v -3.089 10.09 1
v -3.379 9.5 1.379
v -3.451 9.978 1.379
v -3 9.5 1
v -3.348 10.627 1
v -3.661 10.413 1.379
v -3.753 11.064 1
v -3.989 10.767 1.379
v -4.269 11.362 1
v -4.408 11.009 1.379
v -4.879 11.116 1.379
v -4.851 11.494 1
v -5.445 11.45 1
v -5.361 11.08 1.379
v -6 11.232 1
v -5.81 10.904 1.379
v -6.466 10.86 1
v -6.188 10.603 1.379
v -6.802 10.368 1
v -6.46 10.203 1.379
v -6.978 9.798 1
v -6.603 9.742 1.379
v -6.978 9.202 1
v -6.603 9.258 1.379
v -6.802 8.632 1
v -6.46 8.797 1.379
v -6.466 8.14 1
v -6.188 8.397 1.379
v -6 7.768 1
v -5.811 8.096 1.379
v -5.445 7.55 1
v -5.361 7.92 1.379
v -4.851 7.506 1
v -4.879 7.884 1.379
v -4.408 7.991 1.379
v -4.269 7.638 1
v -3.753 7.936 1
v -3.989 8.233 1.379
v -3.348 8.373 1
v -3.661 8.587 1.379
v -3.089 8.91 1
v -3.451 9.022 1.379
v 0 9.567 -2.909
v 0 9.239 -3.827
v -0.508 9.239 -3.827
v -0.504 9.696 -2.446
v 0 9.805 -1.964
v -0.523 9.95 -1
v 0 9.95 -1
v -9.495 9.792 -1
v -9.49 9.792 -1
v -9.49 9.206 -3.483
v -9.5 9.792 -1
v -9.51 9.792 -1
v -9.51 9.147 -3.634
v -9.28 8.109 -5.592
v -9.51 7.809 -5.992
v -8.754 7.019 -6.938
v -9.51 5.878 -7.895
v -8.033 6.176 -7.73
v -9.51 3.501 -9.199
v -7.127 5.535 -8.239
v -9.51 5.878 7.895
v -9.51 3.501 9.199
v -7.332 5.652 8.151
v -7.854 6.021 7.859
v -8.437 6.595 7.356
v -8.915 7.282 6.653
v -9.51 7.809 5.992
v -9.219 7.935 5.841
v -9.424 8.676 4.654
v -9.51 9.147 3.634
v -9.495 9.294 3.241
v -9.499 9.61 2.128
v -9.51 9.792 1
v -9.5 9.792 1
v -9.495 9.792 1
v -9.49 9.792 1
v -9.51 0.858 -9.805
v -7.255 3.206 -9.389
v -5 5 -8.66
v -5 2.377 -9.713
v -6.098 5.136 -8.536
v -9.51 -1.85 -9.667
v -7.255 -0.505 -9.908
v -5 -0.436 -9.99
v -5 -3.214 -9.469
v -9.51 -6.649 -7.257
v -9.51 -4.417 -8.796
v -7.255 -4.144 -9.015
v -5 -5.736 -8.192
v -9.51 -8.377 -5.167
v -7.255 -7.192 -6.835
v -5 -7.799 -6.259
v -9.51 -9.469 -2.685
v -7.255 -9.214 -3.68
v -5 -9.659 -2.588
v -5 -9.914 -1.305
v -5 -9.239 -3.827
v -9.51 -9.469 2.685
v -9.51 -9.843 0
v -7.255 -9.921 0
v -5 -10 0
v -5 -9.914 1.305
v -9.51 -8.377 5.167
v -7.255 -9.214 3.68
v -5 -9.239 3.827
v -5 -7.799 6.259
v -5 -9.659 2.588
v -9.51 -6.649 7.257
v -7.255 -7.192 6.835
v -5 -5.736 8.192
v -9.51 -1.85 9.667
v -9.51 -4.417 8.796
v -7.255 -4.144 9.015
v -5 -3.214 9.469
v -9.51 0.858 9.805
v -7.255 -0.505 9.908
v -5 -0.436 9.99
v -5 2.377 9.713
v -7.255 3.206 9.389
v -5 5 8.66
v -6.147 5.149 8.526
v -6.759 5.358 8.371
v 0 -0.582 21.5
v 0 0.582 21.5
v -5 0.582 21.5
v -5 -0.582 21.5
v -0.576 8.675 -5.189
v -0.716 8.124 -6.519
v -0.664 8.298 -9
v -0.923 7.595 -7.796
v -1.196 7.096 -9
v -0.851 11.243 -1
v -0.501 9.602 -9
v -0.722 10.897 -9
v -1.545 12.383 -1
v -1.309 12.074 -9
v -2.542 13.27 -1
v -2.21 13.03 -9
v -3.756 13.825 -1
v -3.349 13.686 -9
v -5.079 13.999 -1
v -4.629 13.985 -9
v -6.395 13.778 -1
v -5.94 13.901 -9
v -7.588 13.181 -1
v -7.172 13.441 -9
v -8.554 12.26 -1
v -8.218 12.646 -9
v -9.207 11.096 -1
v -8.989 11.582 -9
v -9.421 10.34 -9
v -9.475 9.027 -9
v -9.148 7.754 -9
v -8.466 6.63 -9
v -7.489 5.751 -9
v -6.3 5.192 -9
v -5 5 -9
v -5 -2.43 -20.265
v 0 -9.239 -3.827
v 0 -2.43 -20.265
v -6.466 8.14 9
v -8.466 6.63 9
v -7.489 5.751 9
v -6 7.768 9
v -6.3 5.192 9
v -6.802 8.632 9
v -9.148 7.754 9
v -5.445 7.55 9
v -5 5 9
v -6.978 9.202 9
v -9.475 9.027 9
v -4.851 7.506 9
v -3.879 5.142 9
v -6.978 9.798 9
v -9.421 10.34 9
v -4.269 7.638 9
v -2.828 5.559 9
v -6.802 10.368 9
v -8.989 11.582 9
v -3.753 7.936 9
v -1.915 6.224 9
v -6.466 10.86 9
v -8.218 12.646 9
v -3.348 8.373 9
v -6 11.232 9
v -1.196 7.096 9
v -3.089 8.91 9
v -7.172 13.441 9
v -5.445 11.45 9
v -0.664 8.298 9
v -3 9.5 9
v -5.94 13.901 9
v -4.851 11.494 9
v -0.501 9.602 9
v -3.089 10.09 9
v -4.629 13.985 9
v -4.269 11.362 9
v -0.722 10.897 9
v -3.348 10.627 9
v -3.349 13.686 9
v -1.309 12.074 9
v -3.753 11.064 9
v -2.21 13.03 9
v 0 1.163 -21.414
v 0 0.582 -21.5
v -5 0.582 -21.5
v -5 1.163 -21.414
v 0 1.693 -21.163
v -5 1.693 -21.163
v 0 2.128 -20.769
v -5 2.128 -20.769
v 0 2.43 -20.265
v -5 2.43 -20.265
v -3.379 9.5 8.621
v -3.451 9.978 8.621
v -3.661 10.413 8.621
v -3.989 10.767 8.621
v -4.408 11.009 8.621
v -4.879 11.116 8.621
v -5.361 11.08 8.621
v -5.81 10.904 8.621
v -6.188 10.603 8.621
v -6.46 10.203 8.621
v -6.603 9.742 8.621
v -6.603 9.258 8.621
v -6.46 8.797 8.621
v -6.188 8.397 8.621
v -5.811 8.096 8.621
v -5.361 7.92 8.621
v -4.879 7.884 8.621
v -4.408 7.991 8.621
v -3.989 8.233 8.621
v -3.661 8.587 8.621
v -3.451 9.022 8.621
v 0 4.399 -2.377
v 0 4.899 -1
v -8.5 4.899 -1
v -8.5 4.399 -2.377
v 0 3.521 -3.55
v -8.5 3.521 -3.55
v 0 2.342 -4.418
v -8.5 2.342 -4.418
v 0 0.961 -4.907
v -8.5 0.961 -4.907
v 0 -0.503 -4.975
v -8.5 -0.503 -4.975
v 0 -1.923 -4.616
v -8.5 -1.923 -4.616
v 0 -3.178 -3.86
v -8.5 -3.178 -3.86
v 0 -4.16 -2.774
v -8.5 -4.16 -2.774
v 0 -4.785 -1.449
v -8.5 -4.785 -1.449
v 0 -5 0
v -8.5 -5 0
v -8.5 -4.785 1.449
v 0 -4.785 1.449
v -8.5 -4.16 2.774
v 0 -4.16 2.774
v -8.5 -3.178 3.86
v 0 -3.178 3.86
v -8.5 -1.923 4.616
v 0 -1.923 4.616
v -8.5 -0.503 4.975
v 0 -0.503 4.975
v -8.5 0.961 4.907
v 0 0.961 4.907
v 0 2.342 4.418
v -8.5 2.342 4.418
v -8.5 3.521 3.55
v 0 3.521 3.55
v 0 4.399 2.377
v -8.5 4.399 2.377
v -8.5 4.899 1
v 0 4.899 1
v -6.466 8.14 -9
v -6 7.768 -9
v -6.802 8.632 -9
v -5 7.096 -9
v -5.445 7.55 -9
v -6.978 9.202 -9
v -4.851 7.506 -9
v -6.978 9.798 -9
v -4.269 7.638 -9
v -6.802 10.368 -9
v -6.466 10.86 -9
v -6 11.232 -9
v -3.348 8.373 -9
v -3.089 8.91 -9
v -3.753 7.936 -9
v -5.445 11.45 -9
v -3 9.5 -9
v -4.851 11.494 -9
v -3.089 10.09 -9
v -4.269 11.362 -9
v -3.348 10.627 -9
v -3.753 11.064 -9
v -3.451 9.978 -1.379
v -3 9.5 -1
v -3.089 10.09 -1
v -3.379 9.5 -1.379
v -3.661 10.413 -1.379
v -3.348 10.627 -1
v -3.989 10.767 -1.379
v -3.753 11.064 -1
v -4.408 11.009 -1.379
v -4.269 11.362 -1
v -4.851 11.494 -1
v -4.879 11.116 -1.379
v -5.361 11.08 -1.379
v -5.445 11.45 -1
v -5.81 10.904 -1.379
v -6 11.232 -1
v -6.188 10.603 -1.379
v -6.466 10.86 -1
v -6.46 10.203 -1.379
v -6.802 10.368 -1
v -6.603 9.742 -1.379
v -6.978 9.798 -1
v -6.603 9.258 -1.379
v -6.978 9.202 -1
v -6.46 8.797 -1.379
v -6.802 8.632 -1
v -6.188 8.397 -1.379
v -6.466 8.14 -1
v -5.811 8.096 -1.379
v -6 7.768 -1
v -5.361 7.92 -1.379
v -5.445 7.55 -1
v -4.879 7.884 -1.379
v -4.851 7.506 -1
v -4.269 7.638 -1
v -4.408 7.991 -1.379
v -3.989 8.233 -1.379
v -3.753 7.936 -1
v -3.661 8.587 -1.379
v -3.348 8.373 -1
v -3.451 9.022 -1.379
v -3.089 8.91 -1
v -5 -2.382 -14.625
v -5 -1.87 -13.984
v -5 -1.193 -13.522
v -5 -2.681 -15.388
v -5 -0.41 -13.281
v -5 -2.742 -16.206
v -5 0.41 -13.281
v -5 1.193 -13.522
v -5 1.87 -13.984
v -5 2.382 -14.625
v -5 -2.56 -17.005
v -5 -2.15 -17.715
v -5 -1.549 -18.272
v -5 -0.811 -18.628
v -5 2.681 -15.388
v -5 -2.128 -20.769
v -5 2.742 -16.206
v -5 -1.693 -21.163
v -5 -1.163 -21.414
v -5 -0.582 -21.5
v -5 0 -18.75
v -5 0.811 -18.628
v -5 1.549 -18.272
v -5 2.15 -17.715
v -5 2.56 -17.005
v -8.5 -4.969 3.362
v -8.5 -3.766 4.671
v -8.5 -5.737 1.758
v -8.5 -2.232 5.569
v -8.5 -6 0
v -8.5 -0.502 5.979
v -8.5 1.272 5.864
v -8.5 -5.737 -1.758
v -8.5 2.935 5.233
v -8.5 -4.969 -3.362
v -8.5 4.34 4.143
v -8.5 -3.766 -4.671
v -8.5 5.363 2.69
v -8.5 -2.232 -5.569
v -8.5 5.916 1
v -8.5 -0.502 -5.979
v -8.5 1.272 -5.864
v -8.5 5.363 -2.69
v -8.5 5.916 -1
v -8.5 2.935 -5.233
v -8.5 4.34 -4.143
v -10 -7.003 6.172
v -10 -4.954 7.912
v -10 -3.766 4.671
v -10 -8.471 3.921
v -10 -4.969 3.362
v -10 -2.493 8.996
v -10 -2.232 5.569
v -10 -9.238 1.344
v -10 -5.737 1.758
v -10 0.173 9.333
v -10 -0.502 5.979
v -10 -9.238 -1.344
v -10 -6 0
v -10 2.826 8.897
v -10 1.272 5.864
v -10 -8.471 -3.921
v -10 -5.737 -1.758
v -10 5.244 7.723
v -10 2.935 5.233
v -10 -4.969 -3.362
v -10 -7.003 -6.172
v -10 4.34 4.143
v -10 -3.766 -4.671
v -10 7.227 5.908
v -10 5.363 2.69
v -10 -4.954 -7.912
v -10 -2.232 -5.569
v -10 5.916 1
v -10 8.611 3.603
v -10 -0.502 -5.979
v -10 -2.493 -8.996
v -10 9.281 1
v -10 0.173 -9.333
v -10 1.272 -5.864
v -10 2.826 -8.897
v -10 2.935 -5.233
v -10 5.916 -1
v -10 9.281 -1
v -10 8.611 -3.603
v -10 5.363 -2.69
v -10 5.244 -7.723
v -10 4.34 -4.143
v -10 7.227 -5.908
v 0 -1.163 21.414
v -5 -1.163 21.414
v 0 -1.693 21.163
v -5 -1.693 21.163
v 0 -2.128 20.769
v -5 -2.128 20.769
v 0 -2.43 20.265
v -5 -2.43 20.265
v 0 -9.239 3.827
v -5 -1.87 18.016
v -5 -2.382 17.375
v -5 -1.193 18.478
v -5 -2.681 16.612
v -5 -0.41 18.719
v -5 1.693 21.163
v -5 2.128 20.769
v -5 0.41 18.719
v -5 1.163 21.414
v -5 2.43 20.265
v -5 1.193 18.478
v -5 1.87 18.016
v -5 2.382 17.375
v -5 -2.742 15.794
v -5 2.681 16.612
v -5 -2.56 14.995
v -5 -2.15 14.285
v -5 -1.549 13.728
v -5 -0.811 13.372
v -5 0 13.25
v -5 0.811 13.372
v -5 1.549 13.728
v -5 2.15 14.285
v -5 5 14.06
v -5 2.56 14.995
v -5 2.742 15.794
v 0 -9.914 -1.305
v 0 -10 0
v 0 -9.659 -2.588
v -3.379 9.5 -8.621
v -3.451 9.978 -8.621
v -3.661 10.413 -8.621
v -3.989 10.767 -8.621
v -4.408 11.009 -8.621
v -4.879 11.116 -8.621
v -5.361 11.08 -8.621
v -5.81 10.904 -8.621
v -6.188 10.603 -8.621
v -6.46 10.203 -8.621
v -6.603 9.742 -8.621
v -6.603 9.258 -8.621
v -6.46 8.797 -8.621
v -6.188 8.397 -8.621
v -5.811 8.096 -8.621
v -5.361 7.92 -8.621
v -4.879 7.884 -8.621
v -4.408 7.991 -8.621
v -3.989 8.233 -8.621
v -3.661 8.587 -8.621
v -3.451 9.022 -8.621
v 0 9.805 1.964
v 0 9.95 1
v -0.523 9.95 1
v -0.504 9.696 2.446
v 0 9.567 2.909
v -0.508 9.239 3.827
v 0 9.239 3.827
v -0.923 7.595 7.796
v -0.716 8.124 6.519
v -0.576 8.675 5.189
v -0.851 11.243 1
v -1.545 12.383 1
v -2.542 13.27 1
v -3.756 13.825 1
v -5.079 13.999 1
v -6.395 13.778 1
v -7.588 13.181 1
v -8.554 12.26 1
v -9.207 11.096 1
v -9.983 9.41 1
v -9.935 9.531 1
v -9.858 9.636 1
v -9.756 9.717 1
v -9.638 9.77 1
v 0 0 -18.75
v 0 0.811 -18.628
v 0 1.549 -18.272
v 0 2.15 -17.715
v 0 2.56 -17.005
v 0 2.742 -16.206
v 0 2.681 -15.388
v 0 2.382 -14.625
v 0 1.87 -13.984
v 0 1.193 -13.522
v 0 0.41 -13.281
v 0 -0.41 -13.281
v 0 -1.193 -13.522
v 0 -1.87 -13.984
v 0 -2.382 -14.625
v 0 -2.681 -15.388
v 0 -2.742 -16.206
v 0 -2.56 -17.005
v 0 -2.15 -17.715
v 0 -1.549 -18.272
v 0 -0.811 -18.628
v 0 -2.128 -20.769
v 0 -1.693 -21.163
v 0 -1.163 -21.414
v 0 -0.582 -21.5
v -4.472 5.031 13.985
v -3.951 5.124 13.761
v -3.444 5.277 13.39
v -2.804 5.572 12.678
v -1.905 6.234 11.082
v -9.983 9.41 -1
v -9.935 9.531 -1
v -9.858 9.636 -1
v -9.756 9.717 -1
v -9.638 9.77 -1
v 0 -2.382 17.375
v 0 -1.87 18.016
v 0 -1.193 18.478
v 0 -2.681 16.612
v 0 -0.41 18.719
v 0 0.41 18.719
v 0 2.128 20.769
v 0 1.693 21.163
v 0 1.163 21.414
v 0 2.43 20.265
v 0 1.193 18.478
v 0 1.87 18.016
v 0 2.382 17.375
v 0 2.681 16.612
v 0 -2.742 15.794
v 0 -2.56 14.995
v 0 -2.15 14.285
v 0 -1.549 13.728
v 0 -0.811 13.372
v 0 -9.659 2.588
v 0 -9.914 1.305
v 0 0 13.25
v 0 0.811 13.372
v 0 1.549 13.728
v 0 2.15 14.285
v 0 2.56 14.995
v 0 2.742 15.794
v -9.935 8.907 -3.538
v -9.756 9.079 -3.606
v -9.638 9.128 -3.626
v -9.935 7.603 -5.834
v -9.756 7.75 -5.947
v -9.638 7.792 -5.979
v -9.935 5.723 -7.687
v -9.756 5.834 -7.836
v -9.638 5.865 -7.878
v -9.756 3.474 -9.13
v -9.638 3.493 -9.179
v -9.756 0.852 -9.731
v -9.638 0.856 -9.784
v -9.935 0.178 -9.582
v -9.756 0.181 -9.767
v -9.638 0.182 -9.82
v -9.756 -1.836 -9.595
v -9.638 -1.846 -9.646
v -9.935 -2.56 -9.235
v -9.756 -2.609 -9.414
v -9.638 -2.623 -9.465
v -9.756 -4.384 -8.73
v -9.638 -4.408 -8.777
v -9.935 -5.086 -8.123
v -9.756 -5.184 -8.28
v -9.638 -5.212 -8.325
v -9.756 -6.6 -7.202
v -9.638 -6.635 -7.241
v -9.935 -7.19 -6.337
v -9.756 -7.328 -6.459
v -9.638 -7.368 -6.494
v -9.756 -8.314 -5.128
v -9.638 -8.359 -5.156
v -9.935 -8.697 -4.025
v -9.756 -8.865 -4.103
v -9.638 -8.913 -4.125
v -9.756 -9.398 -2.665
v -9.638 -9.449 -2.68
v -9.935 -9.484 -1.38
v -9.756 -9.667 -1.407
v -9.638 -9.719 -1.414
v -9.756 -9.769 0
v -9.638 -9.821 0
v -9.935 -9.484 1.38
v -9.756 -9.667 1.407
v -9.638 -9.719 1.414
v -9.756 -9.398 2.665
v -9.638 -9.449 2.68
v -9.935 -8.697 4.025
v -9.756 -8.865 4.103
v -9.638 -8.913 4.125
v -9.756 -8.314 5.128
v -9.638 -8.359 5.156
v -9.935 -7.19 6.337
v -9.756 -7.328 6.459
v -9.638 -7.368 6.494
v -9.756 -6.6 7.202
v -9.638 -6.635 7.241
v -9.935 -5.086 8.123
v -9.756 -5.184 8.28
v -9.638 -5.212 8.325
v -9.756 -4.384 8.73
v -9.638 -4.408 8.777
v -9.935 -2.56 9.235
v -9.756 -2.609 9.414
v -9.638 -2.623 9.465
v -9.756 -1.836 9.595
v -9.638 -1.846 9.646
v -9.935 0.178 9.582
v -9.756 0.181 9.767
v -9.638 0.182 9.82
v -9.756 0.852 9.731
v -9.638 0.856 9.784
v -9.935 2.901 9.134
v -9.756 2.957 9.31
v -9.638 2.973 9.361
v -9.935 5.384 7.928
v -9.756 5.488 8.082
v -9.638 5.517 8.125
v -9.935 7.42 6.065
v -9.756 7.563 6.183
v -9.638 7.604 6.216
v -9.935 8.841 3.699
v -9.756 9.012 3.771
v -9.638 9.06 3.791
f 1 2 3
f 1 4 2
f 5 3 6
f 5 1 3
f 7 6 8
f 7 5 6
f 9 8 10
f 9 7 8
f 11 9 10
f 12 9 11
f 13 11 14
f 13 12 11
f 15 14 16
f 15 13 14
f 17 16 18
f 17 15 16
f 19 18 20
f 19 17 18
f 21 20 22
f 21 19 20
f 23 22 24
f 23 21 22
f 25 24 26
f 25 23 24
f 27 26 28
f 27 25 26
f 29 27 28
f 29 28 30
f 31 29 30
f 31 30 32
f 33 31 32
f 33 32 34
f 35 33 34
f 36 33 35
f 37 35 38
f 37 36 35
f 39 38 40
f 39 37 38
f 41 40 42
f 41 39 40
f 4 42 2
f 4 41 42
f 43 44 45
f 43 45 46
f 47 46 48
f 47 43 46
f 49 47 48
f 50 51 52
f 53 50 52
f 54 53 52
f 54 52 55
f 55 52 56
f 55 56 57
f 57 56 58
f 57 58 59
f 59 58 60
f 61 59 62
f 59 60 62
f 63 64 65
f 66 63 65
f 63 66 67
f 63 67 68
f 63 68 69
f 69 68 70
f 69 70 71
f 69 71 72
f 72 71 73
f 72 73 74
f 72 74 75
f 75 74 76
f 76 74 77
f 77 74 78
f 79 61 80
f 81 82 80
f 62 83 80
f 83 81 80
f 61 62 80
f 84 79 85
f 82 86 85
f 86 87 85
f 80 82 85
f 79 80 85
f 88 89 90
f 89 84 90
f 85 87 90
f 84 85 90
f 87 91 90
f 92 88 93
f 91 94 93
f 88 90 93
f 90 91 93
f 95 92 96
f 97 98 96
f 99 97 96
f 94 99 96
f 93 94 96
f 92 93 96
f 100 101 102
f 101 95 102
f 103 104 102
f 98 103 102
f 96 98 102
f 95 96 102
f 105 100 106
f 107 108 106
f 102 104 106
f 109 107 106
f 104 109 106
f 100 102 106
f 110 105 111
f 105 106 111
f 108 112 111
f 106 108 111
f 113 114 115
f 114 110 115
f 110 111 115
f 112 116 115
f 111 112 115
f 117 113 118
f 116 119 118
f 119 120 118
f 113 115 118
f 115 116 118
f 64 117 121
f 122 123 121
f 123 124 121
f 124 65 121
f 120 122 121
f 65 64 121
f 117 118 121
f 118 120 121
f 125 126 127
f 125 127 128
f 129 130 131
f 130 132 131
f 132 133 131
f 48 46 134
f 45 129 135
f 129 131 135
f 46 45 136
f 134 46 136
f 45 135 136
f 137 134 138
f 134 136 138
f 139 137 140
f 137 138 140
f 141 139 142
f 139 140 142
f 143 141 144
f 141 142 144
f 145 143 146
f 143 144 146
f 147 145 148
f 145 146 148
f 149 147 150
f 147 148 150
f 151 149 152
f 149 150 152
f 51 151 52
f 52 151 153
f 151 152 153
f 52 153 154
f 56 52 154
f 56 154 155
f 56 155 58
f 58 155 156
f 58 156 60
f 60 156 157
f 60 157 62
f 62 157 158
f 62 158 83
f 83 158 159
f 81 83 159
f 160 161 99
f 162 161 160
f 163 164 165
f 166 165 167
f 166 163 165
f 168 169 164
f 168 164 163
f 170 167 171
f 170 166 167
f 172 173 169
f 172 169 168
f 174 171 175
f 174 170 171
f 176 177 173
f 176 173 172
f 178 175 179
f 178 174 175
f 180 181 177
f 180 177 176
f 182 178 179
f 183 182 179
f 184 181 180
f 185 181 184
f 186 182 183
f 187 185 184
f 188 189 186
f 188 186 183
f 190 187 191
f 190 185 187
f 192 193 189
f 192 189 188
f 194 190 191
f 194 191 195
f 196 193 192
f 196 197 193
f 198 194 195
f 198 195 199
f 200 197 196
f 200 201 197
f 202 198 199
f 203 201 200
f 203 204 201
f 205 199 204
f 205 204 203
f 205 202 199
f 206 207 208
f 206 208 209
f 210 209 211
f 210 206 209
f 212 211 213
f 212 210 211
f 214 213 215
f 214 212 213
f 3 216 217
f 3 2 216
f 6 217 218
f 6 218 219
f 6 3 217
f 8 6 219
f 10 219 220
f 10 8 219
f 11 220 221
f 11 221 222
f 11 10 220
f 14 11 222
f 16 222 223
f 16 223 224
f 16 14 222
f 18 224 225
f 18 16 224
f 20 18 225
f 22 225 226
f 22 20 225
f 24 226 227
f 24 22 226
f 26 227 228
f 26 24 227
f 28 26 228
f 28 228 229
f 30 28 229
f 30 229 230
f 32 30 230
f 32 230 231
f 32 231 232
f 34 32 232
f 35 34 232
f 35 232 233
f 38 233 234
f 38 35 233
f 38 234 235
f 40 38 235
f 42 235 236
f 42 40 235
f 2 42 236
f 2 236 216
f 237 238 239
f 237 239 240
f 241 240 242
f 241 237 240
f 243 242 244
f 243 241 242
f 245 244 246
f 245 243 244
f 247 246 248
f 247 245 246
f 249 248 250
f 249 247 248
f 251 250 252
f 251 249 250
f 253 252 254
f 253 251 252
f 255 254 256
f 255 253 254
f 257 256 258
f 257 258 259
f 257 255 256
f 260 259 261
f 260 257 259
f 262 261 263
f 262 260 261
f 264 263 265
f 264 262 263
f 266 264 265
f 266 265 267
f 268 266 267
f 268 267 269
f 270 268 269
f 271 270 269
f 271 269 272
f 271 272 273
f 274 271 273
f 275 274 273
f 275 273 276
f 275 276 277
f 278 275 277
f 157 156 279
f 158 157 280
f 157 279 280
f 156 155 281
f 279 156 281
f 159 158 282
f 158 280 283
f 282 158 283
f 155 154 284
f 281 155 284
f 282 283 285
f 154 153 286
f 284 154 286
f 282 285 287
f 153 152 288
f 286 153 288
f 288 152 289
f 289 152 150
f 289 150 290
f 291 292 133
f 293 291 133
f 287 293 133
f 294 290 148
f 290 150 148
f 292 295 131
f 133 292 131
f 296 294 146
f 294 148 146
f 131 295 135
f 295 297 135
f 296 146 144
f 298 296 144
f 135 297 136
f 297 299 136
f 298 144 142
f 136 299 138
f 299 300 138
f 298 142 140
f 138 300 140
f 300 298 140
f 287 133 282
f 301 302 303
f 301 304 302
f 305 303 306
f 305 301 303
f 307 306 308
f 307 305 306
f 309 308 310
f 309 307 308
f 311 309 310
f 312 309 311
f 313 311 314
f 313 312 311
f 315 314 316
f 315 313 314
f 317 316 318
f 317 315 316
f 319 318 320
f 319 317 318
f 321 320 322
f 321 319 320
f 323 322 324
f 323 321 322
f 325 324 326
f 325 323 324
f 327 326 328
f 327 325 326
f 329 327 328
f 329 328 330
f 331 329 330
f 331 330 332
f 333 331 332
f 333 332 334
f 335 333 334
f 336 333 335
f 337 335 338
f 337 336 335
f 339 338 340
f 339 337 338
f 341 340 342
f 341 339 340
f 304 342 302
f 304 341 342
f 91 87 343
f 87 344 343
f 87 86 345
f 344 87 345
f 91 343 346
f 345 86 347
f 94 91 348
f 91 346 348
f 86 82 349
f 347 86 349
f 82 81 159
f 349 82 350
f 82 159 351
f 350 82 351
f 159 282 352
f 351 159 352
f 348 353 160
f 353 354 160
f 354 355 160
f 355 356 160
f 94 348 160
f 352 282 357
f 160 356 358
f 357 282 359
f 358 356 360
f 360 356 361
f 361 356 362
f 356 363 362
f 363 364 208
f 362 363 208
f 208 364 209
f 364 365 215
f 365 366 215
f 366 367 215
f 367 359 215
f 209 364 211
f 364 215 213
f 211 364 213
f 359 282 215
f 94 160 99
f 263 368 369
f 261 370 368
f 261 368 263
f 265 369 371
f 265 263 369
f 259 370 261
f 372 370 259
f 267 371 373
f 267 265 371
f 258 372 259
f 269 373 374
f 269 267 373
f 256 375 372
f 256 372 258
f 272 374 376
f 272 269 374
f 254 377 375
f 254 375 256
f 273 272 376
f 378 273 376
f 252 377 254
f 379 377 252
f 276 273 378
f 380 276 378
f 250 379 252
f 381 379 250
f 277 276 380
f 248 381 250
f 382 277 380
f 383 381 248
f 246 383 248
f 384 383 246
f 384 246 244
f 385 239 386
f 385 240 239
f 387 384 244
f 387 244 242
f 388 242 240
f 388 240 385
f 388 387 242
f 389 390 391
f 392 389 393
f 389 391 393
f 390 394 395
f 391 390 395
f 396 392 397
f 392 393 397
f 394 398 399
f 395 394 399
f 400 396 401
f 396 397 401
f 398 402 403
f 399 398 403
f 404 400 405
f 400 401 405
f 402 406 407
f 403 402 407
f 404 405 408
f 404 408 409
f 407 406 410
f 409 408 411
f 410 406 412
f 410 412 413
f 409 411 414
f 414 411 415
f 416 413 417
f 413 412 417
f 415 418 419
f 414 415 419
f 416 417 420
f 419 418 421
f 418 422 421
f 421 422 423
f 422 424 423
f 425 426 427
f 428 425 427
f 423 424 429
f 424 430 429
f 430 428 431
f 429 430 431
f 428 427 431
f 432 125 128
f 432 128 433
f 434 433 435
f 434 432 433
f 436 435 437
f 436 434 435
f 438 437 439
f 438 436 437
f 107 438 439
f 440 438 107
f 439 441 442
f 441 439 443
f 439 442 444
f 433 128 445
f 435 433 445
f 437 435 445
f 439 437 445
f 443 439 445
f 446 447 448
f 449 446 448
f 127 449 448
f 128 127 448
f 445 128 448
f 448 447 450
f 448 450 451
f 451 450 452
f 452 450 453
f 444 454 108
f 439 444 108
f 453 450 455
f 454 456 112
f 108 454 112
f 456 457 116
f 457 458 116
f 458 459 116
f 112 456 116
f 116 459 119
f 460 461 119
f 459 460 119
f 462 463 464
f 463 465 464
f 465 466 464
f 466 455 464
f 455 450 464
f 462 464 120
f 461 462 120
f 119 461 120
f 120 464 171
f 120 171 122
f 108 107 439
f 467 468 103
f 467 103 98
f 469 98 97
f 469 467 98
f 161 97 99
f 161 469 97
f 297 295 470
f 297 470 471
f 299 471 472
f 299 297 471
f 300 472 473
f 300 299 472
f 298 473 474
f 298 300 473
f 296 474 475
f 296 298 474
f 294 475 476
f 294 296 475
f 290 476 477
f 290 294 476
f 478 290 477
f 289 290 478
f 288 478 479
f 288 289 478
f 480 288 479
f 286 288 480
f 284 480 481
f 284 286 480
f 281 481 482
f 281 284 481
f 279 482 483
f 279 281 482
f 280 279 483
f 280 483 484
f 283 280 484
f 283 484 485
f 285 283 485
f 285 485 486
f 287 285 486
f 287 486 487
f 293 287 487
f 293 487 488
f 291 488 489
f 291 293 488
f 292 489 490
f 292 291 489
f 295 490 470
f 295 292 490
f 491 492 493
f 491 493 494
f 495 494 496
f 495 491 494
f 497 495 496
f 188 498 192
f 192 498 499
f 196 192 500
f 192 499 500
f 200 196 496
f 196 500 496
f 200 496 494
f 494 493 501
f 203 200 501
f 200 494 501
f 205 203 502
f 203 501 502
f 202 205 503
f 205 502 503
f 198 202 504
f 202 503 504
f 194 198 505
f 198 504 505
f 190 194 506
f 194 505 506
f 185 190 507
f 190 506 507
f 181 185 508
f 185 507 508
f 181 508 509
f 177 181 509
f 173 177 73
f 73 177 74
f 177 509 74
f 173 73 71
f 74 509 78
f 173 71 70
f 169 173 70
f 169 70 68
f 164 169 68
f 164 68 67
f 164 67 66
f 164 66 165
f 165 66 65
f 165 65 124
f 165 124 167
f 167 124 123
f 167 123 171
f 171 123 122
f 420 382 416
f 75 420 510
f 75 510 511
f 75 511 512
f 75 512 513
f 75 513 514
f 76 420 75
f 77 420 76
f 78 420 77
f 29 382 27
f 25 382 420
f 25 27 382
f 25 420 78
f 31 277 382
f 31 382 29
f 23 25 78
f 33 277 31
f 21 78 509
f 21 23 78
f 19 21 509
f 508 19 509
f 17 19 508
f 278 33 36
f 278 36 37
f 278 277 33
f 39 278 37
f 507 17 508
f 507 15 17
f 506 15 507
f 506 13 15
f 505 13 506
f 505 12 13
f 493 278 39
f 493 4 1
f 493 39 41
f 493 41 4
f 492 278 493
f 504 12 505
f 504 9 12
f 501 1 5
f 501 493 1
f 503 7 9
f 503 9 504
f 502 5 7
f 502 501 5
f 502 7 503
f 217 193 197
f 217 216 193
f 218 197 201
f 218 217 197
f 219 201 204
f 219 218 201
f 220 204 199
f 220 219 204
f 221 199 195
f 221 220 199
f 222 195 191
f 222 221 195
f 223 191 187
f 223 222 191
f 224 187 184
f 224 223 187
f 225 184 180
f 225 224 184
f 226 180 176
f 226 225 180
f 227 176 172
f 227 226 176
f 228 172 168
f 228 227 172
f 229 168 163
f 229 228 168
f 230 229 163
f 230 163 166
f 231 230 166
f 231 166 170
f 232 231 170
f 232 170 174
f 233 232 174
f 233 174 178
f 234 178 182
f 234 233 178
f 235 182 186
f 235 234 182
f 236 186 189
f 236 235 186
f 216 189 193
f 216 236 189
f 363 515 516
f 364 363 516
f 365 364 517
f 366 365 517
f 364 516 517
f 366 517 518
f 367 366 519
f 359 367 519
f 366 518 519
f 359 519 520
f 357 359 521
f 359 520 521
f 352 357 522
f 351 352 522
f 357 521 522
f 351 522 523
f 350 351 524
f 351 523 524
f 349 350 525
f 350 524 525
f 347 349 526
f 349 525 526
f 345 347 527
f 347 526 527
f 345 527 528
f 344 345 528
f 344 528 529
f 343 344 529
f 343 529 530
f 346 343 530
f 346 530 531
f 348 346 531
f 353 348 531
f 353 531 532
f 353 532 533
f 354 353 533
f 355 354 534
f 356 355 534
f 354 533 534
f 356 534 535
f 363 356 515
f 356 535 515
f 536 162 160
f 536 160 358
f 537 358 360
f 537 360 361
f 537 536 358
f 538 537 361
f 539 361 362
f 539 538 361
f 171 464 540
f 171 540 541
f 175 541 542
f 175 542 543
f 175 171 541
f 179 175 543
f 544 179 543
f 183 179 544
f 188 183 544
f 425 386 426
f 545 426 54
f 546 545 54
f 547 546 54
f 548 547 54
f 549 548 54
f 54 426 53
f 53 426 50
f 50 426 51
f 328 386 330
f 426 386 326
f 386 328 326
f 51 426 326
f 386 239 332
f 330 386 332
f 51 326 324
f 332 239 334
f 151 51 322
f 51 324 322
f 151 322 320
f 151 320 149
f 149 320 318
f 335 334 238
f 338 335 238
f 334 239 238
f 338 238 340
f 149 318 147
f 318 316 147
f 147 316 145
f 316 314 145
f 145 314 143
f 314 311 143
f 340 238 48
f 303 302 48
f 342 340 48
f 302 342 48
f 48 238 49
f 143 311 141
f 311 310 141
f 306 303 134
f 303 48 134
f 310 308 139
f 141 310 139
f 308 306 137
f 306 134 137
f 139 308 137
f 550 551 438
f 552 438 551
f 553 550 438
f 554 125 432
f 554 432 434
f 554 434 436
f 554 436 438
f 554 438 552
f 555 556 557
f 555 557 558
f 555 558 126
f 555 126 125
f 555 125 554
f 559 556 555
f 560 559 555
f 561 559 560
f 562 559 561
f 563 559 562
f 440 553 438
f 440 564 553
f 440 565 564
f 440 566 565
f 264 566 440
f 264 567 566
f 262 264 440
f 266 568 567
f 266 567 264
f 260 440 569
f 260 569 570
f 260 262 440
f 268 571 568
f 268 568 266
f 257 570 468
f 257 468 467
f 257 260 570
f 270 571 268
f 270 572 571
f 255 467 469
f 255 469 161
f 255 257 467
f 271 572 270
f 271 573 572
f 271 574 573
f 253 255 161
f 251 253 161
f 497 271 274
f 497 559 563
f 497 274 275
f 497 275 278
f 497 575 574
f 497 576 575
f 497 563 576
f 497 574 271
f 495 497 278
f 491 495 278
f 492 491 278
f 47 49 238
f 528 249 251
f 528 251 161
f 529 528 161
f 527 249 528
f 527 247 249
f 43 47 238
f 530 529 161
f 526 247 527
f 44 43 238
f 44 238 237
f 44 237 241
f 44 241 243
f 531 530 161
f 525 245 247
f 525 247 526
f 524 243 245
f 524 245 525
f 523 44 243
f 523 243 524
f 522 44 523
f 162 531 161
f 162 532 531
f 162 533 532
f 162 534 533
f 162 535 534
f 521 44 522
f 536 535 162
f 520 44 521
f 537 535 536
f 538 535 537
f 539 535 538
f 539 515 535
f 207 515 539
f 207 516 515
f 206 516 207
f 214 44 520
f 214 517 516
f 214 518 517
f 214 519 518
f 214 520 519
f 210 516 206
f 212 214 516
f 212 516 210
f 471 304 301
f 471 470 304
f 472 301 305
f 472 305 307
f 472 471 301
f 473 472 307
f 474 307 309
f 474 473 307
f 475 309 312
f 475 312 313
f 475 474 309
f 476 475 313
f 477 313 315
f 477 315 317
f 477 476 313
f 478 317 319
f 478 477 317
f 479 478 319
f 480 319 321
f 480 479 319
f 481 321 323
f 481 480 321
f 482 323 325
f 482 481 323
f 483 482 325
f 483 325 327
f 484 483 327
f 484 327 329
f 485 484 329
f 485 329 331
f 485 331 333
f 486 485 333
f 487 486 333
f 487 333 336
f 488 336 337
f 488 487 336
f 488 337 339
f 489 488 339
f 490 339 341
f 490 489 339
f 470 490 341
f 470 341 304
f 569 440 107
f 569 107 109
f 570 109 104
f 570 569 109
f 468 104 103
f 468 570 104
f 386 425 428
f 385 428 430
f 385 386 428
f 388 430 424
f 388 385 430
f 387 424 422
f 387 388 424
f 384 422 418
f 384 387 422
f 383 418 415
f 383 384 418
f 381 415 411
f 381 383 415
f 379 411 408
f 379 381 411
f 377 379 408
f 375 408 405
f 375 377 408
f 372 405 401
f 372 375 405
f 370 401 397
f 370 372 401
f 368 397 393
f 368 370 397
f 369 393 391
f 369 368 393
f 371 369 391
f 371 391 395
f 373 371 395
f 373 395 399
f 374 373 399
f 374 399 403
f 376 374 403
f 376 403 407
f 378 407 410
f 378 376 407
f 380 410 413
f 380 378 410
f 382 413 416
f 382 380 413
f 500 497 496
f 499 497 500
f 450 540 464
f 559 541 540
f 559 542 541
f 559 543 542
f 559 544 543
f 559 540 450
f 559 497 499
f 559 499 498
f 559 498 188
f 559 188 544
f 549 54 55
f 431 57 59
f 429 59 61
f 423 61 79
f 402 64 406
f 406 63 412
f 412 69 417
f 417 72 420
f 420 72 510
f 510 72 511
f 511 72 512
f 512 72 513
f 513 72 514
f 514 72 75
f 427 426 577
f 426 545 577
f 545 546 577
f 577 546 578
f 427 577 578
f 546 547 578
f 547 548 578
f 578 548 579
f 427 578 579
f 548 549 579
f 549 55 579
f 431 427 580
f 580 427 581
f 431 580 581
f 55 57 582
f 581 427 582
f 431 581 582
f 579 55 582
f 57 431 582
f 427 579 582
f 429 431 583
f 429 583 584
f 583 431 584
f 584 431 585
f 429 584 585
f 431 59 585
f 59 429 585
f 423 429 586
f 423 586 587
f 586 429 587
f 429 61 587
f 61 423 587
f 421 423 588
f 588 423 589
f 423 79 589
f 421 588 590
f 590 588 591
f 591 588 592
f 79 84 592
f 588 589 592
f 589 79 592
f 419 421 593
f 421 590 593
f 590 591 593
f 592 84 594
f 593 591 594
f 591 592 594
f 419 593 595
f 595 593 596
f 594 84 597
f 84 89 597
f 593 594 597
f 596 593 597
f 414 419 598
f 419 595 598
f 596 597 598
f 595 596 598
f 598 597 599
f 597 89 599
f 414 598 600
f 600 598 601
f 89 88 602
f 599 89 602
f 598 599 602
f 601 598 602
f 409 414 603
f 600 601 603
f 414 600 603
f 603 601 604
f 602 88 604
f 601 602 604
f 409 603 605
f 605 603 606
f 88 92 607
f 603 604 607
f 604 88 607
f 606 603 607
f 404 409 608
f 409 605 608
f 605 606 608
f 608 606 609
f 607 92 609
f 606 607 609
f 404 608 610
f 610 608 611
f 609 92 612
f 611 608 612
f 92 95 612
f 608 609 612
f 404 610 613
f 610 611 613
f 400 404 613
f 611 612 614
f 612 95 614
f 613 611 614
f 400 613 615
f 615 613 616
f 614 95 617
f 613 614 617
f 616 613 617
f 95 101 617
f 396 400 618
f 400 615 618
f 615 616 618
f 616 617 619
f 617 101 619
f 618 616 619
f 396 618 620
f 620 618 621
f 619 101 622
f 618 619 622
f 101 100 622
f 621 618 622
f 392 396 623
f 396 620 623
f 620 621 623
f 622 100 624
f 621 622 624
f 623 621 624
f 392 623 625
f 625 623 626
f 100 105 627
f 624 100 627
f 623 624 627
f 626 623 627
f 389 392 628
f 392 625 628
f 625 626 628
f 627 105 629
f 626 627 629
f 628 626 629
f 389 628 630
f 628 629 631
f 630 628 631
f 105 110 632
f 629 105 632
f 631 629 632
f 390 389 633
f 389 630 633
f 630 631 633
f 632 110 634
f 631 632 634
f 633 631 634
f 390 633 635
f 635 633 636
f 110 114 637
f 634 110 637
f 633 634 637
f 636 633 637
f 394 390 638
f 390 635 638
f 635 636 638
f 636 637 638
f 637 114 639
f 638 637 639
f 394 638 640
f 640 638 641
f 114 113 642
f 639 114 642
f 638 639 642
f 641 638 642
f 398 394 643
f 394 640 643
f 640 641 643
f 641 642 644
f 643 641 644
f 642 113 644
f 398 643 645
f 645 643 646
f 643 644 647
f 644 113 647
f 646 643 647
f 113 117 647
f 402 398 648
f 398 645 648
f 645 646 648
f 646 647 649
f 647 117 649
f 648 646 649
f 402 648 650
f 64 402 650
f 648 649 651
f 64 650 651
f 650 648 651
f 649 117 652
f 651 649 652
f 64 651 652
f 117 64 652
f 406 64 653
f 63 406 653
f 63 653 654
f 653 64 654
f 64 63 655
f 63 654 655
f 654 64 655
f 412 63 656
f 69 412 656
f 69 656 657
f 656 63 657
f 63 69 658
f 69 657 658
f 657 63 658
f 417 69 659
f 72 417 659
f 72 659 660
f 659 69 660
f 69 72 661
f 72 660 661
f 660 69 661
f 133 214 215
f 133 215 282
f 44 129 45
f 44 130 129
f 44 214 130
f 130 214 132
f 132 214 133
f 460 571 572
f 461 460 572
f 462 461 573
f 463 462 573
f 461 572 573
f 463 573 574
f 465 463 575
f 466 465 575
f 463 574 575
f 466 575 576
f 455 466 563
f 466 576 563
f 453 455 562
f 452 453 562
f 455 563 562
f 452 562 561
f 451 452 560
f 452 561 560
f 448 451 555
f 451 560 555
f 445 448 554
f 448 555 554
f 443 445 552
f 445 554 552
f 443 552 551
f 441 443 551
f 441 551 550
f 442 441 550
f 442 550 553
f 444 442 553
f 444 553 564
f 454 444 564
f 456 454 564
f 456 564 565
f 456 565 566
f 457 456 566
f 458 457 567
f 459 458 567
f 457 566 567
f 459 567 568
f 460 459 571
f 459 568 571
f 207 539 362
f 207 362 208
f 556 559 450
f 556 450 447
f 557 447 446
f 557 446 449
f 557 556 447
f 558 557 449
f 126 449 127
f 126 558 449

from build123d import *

# Parameters (mm, degrees)
EXTRUDE_1_DEPTH      = 5
EXTRUDE_2_DEPTH      = 9
EXTRUDE_2_DEPTH_BACK = 9
SKETCH_3_R           = 4.5
CUT_EXTRUDE_1_DEPTH  = 9
SKETCH_5_W           = 2
SKETCH_5_H           = 24
CUT_EXTRUDE_2_DEPTH  = 10
SKETCH_9_R           = 2.75
CUT_EXTRUDE_3_DEPTH  = 5
SKETCH_10_R          = 2.75
CUT_EXTRUDE_4_DEPTH  = 5


with BuildPart() as part:
    # 草圖1 → 填料-伸長1 (new body)
    with BuildSketch(Plane(origin=(0, 0, 0), x_dir=(0, 0, -1), z_dir=(1, 0, 0))):
        with BuildLine():
            Line((-21.5, 0.581973136), (-21.5, -0.581973136))
            ThreePointArc((-21.5, -0.581973136), (-21.162939225, -1.693113602), (-20.265366865, -2.429732201))
            Line((-20.265366865, -2.429732201), (-3.826834324, -9.238795325))
            ThreePointArc((-3.826834324, -9.238795325), (-1.95090322, -9.807852804), (0, -10))
            ThreePointArc((0, -10), (1.95090322, -9.807852804), (3.826834324, -9.238795325))
            Line((3.826834324, -9.238795325), (20.265366865, -2.429732201))
            ThreePointArc((20.265366865, -2.429732201), (21.162939225, -1.693113602), (21.5, -0.581973136))
            Line((21.5, -0.581973136), (21.5, 0.581973136))
            ThreePointArc((21.5, 0.581973136), (21.162939225, 1.693113602), (20.265366865, 2.429732201))
            Line((20.265366865, 2.429732201), (3.826834324, 9.238795325))
            ThreePointArc((3.826834324, 9.238795325), (1.95090322, 9.807852804), (0, 10))
            ThreePointArc((0, 10), (-1.95090322, 9.807852804), (-3.826834324, 9.238795325))
            Line((-3.826834324, 9.238795325), (-20.265366865, 2.429732201))
            ThreePointArc((-20.265366865, 2.429732201), (-21.162939225, 1.693113602), (-21.5, 0.581973136))
        make_face()
    extrude(amount=-EXTRUDE_1_DEPTH)

    # 草圖2 → 旋轉1 (revolve)
    with BuildSketch(Plane.XY, mode=Mode.PRIVATE) as revolve_1_sk:
        with BuildLine():
            Line((-10, 0), (-10, 9.334826255))
            ThreePointArc((-10, 9.334826255), (-9.857424619, 9.687712707), (-9.509728944, 9.842516795))
            Line((-9.509728944, 9.842516795), (-5, 10))
            Line((-5, 10), (-5, 0))
            Line((-5, 0), (-10, 0))
        make_face()
    revolve(revolve_1_sk.sketch.rotate(Axis((-5, 0, 0), (-1, 0, 0)), 270), axis=Axis((-5, 0, 0), (-1, 0, 0)))

    # 草圖3 → 填料-伸長2 (add, two sides: drawn at the far end of the back side and taken through both)
    with BuildSketch(Plane.XY.offset(-EXTRUDE_2_DEPTH_BACK)):
        with Locations((-5, 9.5)):
            Circle(SKETCH_3_R)
    extrude(amount=EXTRUDE_2_DEPTH + EXTRUDE_2_DEPTH_BACK)

    # 草圖4 → 除料-伸長1 (cut)
    with BuildSketch(Plane.XY.offset(9)):
        with BuildLine():
            Line((-10, 5), (-5, 5))
            ThreePointArc((-5, 5), (-1.818019485, 12.681980515), (-9.5, 9.5))
            Line((-9.5, 9.5), (-10, 9.5))
            Line((-10, 9.5), (-10, 5))
        make_face()
    extrude(amount=CUT_EXTRUDE_1_DEPTH, mode=Mode.SUBTRACT)

    # 草圖5 → 除料-伸長2 (cut)
    with BuildSketch(Plane(origin=(0, 0, 0), x_dir=(0, 0, -1), z_dir=(1, 0, 0))):
        with Locations((0, 12)):
            Rectangle(SKETCH_5_W, SKETCH_5_H)
    extrude(amount=-CUT_EXTRUDE_2_DEPTH, mode=Mode.SUBTRACT)

    # 草圖6 → 除料-旋轉1 (revolve, cut)
    with BuildSketch(Plane.XY):
        Polygon((-10, 0), (-10, 6), (-8.5, 6), (-8.5, 5), (0, 5), (0, 0), align=None)
    revolve(axis=Axis((0, 0, 0), (-1, 0, 0)), mode=Mode.SUBTRACT)

    # 草圖7 → 除料-旋轉2 (revolve, cut)
    with BuildSketch(Plane(origin=(-5, 0, 0), x_dir=(0, 0, -1), z_dir=(1, 0, 0)), mode=Mode.PRIVATE) as cut_revolve_2_sk:
        Polygon((1, 9.5), (1, 11.5), (1.379, 11.121), (8.621, 11.121), (9.1, 11.6), (13.5, 11.6), (13.5, 9.5), align=None)
    revolve(cut_revolve_2_sk.sketch.rotate(Axis((-5, 9.5, -13.5), (0, 0, 1)), 270), axis=Axis((-5, 9.5, -13.5), (0, 0, 1)), mode=Mode.SUBTRACT)

    # 草圖8 → 除料-旋轉3 (revolve, cut)
    with BuildSketch(Plane(origin=(-5, 0, 0), x_dir=(0, 0, -1), z_dir=(1, 0, 0)), mode=Mode.PRIVATE) as cut_revolve_3_sk:
        Polygon((-9, 9.5), (-9, 11.5), (-8.621, 11.121), (-1.379, 11.121), (-1, 11.5), (-1, 9.5), align=None)
    revolve(cut_revolve_3_sk.sketch.rotate(Axis((-5, 9.5, 1), (0, 0, 1)), 270), axis=Axis((-5, 9.5, 1), (0, 0, 1)), mode=Mode.SUBTRACT)

    # 草圖9 → 除料-伸長3 (cut)
    with BuildSketch(Plane(origin=(0, 0, 0), x_dir=(0, 0, -1), z_dir=(1, 0, 0))):
        with Locations((16, 0)):
            Circle(SKETCH_9_R)
    extrude(amount=-CUT_EXTRUDE_3_DEPTH, mode=Mode.SUBTRACT)

    # 草圖10 → 除料-伸長4 (cut)
    with BuildSketch(Plane(origin=(0, 0, 0), x_dir=(0, 0, -1), z_dir=(1, 0, 0))):
        with Locations((-16, 0)):
            Circle(SKETCH_10_R)
    extrude(amount=-CUT_EXTRUDE_4_DEPTH, mode=Mode.SUBTRACT)


solid = part.part
